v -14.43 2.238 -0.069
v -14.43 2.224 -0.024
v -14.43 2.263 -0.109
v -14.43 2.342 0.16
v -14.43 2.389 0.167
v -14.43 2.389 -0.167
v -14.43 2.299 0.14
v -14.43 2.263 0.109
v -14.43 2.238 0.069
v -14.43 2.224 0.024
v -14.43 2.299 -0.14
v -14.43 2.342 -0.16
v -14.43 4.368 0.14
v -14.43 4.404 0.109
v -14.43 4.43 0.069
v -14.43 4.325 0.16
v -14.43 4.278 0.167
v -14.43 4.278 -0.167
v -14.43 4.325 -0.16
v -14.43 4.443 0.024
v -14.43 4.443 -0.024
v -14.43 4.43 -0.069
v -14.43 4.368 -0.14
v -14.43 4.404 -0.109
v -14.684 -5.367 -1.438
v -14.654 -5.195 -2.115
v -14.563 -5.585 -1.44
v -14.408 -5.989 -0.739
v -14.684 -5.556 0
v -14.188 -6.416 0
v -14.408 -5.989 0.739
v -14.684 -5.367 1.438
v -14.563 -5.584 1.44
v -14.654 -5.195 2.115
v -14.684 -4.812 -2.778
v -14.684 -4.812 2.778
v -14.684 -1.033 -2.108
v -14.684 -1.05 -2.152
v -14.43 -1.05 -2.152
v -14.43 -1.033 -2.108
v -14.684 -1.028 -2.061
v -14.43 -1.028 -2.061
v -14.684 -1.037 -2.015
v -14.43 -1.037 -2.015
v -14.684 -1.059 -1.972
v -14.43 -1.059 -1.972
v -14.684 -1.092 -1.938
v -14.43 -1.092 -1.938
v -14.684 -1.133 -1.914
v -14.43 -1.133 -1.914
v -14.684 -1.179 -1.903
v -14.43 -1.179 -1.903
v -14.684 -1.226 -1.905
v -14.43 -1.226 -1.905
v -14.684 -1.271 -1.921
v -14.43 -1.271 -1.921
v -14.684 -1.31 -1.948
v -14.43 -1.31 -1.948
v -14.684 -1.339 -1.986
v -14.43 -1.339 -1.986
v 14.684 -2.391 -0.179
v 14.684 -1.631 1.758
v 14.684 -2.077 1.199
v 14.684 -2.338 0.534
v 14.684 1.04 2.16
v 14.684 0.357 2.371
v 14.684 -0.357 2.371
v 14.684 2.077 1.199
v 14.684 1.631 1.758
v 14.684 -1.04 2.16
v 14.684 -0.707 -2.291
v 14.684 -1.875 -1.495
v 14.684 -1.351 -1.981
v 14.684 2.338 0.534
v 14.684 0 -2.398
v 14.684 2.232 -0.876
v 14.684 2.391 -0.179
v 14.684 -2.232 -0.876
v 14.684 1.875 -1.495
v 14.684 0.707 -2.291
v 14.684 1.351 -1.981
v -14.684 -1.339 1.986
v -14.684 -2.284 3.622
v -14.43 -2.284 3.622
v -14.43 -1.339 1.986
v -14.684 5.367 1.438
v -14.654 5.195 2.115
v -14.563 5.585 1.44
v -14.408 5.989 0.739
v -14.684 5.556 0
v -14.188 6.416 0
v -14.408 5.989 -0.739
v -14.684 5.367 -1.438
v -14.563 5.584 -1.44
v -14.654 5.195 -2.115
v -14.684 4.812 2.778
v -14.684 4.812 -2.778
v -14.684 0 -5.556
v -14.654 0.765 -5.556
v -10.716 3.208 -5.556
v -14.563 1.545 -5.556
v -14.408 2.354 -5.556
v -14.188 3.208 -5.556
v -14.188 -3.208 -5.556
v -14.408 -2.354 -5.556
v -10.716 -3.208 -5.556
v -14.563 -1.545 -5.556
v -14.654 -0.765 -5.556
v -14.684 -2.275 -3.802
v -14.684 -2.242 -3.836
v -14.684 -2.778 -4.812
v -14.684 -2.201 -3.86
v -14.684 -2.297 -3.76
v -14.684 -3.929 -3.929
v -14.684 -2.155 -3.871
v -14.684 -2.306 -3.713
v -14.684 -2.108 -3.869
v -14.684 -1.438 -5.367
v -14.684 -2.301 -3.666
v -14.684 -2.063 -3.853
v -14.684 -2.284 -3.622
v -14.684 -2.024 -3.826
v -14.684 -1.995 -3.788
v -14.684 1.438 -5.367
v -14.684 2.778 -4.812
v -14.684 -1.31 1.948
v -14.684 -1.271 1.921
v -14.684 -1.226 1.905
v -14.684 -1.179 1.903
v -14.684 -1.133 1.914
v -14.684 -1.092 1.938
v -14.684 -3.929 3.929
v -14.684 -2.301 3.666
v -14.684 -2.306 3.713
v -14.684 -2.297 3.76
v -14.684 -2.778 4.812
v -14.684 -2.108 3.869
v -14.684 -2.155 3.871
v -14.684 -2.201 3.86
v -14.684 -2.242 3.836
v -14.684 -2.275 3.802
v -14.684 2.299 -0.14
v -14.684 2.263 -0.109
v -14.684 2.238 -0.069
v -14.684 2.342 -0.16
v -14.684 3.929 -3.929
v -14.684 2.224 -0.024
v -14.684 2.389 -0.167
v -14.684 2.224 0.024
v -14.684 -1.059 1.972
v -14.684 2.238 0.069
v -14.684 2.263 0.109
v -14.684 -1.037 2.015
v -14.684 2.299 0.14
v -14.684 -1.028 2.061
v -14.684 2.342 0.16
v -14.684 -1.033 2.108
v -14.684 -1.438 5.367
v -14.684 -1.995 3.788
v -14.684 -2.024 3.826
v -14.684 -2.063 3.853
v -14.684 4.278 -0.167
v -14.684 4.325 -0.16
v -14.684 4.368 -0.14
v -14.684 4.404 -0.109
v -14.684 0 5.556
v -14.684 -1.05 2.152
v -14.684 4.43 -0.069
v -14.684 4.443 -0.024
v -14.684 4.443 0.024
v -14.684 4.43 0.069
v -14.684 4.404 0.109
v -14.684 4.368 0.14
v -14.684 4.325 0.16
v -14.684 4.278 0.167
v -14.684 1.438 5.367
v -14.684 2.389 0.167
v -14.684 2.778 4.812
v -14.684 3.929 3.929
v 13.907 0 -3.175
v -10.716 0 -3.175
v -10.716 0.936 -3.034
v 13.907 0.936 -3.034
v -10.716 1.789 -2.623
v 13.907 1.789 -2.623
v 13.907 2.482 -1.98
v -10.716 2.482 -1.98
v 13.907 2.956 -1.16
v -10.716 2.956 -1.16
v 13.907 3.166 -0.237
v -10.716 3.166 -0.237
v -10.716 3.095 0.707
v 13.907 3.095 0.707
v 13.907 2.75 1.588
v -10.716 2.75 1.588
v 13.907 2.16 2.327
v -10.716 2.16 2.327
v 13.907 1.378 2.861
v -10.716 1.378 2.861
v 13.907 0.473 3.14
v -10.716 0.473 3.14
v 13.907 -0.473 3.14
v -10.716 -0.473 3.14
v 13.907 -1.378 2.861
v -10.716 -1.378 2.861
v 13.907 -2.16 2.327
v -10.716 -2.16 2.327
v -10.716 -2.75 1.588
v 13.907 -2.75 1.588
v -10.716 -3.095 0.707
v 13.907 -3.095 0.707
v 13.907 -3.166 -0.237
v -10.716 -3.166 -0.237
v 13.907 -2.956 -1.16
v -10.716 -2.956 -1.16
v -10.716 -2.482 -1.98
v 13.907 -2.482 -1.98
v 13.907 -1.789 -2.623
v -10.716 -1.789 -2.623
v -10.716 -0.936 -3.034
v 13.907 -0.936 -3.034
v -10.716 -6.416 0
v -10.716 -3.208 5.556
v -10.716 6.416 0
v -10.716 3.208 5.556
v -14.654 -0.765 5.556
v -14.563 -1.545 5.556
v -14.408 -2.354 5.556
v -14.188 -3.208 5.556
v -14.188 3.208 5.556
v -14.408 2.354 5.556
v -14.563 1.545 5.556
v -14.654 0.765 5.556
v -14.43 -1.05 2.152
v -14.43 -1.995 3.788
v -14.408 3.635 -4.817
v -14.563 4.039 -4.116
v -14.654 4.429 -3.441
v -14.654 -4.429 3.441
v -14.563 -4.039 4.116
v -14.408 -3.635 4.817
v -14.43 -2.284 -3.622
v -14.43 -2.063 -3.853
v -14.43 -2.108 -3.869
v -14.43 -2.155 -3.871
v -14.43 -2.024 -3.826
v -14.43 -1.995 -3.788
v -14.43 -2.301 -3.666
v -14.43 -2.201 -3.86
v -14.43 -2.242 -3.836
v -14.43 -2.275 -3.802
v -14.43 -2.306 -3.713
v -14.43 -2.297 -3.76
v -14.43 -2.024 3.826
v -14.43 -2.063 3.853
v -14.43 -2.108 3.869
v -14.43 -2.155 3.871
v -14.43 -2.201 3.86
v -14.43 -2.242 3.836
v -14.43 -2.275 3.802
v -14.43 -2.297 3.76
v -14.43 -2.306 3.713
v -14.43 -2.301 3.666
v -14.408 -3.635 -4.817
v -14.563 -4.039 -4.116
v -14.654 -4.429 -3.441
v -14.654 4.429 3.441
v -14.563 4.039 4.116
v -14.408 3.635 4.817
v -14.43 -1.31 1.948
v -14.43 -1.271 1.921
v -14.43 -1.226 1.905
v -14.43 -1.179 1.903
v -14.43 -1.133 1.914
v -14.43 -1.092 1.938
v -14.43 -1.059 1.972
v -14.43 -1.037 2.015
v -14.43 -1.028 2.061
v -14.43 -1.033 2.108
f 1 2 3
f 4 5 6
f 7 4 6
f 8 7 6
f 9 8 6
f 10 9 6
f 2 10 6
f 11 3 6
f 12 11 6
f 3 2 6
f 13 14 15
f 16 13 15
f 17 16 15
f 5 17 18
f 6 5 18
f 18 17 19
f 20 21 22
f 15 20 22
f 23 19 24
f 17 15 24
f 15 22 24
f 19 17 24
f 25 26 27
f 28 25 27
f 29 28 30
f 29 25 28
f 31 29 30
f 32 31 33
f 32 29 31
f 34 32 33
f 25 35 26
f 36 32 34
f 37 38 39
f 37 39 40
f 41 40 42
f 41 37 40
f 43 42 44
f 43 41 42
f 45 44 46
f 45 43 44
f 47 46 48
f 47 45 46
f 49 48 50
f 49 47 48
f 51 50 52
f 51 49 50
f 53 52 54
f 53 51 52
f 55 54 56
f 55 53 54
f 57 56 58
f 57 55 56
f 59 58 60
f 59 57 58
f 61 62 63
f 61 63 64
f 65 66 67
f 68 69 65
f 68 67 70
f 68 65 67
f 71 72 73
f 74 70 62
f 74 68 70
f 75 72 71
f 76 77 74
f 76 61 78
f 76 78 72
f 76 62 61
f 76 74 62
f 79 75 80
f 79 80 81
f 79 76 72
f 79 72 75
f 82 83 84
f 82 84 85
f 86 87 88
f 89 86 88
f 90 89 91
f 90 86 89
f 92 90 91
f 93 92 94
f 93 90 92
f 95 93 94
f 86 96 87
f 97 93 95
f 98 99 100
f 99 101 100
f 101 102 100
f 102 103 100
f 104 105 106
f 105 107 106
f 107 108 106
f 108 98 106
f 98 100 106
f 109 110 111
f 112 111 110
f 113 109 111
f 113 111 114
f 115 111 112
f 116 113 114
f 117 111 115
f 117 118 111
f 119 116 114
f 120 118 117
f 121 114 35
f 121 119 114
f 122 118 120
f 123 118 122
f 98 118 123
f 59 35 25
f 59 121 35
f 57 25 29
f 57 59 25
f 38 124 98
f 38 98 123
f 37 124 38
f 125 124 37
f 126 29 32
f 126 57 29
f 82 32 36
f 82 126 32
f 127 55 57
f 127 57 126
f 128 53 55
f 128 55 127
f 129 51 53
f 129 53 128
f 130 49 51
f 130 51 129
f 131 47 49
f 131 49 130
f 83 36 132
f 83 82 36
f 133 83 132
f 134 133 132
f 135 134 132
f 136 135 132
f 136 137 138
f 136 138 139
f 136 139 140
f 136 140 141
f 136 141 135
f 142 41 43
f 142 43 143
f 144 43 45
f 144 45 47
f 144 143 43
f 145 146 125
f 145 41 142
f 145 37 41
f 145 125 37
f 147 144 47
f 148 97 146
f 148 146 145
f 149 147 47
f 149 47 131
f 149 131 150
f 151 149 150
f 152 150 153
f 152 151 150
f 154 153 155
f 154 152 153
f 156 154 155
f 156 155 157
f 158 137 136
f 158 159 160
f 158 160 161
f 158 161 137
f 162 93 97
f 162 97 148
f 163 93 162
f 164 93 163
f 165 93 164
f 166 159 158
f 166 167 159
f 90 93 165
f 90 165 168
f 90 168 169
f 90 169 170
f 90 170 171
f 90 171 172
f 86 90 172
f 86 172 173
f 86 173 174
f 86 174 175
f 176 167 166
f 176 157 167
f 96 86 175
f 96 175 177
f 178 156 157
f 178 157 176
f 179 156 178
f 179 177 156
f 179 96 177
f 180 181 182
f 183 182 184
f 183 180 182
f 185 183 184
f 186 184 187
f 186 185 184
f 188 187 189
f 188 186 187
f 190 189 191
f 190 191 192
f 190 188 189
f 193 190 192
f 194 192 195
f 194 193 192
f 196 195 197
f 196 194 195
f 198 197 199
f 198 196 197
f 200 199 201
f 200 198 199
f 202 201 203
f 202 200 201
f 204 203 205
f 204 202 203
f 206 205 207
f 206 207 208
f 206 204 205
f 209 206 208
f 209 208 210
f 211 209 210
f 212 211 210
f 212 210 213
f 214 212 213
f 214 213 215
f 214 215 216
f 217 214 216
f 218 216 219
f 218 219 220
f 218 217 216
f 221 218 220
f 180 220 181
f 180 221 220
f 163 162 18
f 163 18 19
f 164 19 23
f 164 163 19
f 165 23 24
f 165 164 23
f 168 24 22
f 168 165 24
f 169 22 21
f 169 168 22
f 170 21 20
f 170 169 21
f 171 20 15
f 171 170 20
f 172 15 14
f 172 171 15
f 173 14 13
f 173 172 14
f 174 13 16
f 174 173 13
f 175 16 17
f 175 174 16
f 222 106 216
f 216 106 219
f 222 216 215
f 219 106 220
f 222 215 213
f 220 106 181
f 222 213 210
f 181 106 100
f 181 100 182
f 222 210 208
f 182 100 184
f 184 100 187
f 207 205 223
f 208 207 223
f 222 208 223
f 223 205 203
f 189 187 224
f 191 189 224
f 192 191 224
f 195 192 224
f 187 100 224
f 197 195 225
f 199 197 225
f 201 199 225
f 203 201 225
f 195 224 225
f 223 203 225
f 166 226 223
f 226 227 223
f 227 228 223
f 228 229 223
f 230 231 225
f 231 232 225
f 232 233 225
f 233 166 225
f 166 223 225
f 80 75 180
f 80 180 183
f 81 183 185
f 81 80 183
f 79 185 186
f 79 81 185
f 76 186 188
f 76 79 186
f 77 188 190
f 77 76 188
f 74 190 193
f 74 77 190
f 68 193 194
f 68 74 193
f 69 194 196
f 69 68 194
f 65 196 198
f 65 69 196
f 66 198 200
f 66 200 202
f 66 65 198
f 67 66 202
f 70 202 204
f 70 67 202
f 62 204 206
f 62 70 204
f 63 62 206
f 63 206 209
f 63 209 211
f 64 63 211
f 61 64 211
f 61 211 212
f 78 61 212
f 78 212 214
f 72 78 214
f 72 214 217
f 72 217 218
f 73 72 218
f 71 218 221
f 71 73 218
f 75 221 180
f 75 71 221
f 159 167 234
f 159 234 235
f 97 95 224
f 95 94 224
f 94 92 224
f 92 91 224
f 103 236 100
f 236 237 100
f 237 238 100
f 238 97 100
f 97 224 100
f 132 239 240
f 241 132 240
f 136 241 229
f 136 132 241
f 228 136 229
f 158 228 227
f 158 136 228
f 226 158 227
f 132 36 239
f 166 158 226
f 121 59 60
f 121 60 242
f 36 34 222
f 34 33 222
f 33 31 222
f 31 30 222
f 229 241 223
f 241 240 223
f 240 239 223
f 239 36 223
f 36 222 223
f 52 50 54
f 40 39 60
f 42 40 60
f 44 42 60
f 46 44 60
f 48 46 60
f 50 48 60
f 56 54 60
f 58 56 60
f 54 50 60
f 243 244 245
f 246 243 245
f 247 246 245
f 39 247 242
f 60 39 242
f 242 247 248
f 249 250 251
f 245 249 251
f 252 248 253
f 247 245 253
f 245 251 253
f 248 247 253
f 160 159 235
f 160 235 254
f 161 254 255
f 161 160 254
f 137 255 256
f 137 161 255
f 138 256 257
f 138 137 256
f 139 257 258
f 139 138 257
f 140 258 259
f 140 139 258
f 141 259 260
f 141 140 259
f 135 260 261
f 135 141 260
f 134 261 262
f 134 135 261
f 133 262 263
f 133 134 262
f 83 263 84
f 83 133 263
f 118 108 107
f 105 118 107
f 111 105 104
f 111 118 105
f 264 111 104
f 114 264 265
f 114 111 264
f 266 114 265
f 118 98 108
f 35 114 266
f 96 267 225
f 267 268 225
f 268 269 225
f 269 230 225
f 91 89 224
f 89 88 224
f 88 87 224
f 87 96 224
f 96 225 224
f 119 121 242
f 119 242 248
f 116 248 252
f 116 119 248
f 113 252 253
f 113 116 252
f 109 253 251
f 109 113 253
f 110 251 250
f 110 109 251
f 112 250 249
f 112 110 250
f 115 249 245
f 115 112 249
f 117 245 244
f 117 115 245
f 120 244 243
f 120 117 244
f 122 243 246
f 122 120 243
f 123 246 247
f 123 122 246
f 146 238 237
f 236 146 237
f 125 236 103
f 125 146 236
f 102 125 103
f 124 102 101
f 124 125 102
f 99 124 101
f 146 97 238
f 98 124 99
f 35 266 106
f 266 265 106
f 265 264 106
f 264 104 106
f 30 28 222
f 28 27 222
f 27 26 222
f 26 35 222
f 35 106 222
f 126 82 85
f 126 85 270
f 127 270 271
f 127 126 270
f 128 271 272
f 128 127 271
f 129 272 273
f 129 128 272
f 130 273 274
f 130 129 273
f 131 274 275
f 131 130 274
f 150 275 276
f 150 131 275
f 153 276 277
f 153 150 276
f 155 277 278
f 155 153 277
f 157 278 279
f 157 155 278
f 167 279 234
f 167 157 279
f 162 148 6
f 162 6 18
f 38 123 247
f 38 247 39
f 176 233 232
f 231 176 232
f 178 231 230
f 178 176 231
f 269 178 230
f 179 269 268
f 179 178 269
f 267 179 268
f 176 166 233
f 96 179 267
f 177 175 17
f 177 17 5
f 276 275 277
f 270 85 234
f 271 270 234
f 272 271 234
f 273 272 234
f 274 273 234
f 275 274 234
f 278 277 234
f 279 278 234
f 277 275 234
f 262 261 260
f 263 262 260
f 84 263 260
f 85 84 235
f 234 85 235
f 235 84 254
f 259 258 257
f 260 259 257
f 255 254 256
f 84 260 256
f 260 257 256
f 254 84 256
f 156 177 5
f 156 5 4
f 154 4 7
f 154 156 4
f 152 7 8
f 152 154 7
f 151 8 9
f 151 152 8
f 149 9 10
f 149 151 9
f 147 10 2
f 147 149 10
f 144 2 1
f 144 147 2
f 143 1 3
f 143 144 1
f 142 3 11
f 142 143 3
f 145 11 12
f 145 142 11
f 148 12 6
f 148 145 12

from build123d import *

# Parameters (mm, degrees)
SKETCH5_R           = 3.175
BOSS_EXTRUDE3_DEPTH = 25.4
CHAMFER1_SIZE       = 0.77724
BOSS_EXTRUDE4_DEPTH = 3.96875
SKETCH8_OUTSIDE_W   = 129.26
SKETCH8_OUTSIDE_H   = 130.98
SKETCH8_OUTSIDE_R   = 5.55625
CUT_EXTRUDE3_DEPTH  = 31.570540439
CUT_EXTRUDE3_DRAFT  = -60
CUT_EXTRUDE4_DEPTH  = 0.254
CIRPATTERN1_COUNT   = 3


with BuildPart() as part:
    # Sketch5 → Boss-Extrude3 (new body)
    with BuildSketch(Plane(origin=(14.684375, 0, 0), x_dir=(0, 0, -1), z_dir=(1, 0, 0))):
        Circle(SKETCH5_R)
    extrude(amount=-BOSS_EXTRUDE3_DEPTH)

    # Chamfer1
    chamfer1_edges = [part.edges().sort_by_distance(p)[0] for p in [
        (14.684375, 0, 3.175),
    ]]
    chamfer(chamfer1_edges, length=CHAMFER1_SIZE)

    # Sketch6 → Boss-Extrude4 (add)
    with BuildSketch(Plane.ZY.offset(10.715625)):
        Polygon((5.55625, 3.207902433), (0, 6.415804866), (-5.55625, 3.207902433), (-5.55625, -3.207902433), (0, -6.415804866), (5.55625, -3.207902433), align=None)
    extrude(amount=BOSS_EXTRUDE4_DEPTH)


with BuildPart() as cut_extrude3_tool:
    # Sketch8 outside → Cut-Extrude3 (with draft: the straight prism first)
    with BuildSketch(Plane.ZY.offset(14.684375)):
        Rectangle(SKETCH8_OUTSIDE_W, SKETCH8_OUTSIDE_H)
        Circle(SKETCH8_OUTSIDE_R, mode=Mode.SUBTRACT)
    extrude(amount=-CUT_EXTRUDE3_DEPTH)
    # Cut-Extrude3: the draft: its side faces are tilted about the plane it starts from
    cut_extrude3_sides = [cut_extrude3_tool.faces().sort_by_distance(p)[0] for p in [
        (1.100895219, -65.49, 0),
        (1.100895219, 0, 64.63),
        (1.100895219, 65.49, 0),
        (1.100895219, 0, -64.63),
        (1.100895219, 0, -5.55625),
    ]]
    draft(cut_extrude3_sides, Plane.ZY.offset(14.684375), CUT_EXTRUDE3_DRAFT)


with BuildPart() as part_1:
    add(part.part)

    # Cut-Extrude3: cut by cut_extrude3_tool
    add(cut_extrude3_tool.part, mode=Mode.SUBTRACT)

    # Sketch12 → Cut-Extrude4 (cut)
    with BuildSketch(Plane.ZY.offset(14.684375)):
        with BuildLine():
            Line((0.1666875, 4.2783125), (0.1666875, 2.3891875))
            ThreePointArc((0.1666875, 2.3891875), (0, 2.2225), (-0.1666875, 2.3891875))
            Line((-0.1666875, 2.3891875), (-0.1666875, 4.2783125))
            ThreePointArc((-0.1666875, 4.2783125), (0, 4.445), (0.1666875, 4.2783125))
        make_face()
    cut_extrude4 = extrude(amount=-CUT_EXTRUDE4_DEPTH, mode=Mode.SUBTRACT)

    # CirPattern1: Cut-Extrude4 ×3 about axis
    cirpattern1_axis = Axis((0, 0, 0), (1, 0, 0))
    for i in range(1, CIRPATTERN1_COUNT):
        add(cut_extrude4.rotate(cirpattern1_axis, i * 360 / CIRPATTERN1_COUNT), mode=Mode.SUBTRACT)


solid = part_1.part
